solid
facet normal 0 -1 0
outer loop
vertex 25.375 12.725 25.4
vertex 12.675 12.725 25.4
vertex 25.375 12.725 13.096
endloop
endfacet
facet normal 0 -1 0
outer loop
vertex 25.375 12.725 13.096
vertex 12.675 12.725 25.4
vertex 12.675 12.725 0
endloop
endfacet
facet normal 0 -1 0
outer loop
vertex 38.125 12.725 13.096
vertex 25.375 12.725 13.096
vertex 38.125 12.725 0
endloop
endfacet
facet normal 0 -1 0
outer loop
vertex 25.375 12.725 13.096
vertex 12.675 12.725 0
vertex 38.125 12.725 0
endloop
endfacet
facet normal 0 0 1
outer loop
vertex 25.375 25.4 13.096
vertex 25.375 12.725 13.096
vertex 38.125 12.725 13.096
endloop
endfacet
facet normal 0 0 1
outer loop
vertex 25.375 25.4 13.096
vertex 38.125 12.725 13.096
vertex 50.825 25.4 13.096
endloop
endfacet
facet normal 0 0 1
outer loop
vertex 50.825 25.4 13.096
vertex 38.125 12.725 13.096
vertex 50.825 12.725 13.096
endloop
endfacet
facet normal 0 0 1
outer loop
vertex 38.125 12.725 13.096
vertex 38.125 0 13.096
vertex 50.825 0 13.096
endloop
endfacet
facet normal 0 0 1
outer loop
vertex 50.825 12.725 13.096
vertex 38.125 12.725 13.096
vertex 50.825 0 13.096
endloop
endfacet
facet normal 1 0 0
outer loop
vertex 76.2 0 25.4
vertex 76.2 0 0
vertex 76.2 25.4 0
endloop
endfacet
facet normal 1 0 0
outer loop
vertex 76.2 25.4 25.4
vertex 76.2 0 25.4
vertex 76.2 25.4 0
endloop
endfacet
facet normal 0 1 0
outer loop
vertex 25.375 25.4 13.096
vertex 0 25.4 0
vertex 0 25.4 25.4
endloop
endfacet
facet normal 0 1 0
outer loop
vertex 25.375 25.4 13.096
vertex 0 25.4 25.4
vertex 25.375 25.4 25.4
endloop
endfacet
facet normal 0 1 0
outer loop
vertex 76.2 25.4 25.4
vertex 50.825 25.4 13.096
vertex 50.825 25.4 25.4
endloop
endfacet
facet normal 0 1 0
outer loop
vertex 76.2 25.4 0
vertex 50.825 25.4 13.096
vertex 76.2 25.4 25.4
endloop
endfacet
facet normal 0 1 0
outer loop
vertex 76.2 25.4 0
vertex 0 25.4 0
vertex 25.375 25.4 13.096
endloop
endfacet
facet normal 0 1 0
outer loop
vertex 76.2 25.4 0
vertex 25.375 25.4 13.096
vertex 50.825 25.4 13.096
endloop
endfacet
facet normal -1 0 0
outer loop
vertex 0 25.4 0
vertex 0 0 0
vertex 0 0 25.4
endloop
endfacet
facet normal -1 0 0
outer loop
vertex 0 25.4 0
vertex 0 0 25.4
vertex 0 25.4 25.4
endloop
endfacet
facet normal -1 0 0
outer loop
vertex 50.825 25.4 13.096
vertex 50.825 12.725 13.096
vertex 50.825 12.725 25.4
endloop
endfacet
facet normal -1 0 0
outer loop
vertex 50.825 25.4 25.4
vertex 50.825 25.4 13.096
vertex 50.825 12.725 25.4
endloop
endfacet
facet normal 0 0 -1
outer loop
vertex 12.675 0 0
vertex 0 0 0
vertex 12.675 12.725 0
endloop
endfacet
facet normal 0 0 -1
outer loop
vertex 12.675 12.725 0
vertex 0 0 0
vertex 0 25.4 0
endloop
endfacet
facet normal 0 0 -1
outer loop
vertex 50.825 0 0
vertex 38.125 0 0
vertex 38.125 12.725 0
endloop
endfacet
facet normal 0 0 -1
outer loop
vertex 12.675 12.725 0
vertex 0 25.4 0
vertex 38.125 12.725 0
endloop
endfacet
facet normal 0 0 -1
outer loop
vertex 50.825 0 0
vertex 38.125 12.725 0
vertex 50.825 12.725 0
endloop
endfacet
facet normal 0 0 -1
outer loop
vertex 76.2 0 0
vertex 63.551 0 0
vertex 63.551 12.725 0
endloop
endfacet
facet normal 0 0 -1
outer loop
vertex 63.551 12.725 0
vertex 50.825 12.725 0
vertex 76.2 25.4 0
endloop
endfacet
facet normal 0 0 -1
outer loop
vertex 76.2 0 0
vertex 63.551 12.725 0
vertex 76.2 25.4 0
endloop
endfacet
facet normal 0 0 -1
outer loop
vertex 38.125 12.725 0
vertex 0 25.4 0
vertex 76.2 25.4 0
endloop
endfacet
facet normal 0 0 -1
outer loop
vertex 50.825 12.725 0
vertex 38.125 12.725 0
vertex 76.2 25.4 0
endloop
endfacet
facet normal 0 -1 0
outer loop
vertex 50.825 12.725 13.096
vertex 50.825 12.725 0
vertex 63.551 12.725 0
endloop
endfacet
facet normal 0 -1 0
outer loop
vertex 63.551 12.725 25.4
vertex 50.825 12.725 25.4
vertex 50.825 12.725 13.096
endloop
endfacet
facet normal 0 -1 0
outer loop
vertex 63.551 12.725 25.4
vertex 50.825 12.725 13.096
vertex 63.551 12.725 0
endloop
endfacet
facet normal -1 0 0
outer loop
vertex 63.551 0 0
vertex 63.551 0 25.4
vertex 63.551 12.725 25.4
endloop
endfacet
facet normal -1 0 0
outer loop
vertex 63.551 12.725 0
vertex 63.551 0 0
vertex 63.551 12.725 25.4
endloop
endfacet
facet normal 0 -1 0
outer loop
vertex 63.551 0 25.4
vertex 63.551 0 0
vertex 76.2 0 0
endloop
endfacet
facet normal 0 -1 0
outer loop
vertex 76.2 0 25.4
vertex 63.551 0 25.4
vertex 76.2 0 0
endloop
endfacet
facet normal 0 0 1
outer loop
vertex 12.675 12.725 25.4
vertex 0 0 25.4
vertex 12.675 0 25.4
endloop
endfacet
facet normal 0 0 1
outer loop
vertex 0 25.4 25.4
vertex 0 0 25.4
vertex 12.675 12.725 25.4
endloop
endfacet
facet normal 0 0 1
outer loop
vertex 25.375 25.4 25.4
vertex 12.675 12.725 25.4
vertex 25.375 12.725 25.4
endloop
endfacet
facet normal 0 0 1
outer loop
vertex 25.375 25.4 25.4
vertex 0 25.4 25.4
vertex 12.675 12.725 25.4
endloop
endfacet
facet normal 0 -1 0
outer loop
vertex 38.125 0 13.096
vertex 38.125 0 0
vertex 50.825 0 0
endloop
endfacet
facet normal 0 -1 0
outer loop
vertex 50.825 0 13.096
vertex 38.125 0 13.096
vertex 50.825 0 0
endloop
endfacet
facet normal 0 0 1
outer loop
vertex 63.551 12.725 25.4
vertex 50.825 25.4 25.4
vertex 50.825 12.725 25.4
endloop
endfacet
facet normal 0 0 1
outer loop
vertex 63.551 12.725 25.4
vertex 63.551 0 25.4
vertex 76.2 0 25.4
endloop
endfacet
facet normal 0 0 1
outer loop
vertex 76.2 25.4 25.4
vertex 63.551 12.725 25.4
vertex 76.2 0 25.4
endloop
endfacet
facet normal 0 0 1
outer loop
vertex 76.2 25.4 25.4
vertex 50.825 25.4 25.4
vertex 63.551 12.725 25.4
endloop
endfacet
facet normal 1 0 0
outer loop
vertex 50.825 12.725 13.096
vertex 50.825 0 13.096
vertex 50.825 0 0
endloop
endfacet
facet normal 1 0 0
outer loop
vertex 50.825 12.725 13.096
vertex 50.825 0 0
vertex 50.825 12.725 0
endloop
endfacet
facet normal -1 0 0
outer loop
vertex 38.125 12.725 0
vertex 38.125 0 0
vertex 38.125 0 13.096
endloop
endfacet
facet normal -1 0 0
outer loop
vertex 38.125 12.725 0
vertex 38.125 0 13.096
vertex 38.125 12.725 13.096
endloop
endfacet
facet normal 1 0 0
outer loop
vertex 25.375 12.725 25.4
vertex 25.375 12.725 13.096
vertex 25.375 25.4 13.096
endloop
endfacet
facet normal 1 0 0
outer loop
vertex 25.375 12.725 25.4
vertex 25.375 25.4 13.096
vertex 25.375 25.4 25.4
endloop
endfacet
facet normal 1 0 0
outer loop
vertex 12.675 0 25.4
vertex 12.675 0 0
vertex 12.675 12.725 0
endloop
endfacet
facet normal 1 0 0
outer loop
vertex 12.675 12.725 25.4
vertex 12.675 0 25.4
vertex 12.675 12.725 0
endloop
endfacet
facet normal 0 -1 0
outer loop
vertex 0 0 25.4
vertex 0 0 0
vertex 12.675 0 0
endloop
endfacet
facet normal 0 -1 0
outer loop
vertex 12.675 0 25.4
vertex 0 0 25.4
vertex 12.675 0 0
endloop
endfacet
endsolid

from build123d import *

# Parameters (mm, degrees)
F0_W     = 76.2
F0_H     = 25.4
F1_DEPTH = 25.4
F2_W     = 25.4508
F2_H     = 12.7254
F3_DEPTH = 25.4
F4_W     = 12.7254
F4_H     = 12.7254
F5_DEPTH = 25.4
F6_W     = 25.4508
F6_H     = 12.7254
F7_DEPTH = 25.654


with BuildPart() as f1:
    # F0 (on Top) → F1 (new body)
    with BuildSketch(Plane.XY):
        with Locations((38.1, 12.7)):
            Rectangle(F0_W, F0_H)
    extrude(amount=F1_DEPTH)

    # F2 (on Front) → F3 (cut)
    with BuildSketch(Plane.XZ):
        with Locations((38.1, 19.458432)):
            Rectangle(F2_W, F2_H)
    extrude(amount=-F3_DEPTH, mode=Mode.SUBTRACT)

    # F4 (on face) → F5 (cut)
    with BuildSketch(Plane.XY.offset(25.4)):
        with Locations((57.1881, 6.3627)):
            Rectangle(F4_W, F4_H)
    extrude(amount=-F5_DEPTH, mode=Mode.SUBTRACT)

    # F6 (on Top) → F7 (cut)
    with BuildSketch(Plane.XY):
        with Locations((25.4, 6.3627)):
            Rectangle(F6_W, F6_H)
    extrude(amount=F7_DEPTH, mode=Mode.SUBTRACT)


solid = f1.part
